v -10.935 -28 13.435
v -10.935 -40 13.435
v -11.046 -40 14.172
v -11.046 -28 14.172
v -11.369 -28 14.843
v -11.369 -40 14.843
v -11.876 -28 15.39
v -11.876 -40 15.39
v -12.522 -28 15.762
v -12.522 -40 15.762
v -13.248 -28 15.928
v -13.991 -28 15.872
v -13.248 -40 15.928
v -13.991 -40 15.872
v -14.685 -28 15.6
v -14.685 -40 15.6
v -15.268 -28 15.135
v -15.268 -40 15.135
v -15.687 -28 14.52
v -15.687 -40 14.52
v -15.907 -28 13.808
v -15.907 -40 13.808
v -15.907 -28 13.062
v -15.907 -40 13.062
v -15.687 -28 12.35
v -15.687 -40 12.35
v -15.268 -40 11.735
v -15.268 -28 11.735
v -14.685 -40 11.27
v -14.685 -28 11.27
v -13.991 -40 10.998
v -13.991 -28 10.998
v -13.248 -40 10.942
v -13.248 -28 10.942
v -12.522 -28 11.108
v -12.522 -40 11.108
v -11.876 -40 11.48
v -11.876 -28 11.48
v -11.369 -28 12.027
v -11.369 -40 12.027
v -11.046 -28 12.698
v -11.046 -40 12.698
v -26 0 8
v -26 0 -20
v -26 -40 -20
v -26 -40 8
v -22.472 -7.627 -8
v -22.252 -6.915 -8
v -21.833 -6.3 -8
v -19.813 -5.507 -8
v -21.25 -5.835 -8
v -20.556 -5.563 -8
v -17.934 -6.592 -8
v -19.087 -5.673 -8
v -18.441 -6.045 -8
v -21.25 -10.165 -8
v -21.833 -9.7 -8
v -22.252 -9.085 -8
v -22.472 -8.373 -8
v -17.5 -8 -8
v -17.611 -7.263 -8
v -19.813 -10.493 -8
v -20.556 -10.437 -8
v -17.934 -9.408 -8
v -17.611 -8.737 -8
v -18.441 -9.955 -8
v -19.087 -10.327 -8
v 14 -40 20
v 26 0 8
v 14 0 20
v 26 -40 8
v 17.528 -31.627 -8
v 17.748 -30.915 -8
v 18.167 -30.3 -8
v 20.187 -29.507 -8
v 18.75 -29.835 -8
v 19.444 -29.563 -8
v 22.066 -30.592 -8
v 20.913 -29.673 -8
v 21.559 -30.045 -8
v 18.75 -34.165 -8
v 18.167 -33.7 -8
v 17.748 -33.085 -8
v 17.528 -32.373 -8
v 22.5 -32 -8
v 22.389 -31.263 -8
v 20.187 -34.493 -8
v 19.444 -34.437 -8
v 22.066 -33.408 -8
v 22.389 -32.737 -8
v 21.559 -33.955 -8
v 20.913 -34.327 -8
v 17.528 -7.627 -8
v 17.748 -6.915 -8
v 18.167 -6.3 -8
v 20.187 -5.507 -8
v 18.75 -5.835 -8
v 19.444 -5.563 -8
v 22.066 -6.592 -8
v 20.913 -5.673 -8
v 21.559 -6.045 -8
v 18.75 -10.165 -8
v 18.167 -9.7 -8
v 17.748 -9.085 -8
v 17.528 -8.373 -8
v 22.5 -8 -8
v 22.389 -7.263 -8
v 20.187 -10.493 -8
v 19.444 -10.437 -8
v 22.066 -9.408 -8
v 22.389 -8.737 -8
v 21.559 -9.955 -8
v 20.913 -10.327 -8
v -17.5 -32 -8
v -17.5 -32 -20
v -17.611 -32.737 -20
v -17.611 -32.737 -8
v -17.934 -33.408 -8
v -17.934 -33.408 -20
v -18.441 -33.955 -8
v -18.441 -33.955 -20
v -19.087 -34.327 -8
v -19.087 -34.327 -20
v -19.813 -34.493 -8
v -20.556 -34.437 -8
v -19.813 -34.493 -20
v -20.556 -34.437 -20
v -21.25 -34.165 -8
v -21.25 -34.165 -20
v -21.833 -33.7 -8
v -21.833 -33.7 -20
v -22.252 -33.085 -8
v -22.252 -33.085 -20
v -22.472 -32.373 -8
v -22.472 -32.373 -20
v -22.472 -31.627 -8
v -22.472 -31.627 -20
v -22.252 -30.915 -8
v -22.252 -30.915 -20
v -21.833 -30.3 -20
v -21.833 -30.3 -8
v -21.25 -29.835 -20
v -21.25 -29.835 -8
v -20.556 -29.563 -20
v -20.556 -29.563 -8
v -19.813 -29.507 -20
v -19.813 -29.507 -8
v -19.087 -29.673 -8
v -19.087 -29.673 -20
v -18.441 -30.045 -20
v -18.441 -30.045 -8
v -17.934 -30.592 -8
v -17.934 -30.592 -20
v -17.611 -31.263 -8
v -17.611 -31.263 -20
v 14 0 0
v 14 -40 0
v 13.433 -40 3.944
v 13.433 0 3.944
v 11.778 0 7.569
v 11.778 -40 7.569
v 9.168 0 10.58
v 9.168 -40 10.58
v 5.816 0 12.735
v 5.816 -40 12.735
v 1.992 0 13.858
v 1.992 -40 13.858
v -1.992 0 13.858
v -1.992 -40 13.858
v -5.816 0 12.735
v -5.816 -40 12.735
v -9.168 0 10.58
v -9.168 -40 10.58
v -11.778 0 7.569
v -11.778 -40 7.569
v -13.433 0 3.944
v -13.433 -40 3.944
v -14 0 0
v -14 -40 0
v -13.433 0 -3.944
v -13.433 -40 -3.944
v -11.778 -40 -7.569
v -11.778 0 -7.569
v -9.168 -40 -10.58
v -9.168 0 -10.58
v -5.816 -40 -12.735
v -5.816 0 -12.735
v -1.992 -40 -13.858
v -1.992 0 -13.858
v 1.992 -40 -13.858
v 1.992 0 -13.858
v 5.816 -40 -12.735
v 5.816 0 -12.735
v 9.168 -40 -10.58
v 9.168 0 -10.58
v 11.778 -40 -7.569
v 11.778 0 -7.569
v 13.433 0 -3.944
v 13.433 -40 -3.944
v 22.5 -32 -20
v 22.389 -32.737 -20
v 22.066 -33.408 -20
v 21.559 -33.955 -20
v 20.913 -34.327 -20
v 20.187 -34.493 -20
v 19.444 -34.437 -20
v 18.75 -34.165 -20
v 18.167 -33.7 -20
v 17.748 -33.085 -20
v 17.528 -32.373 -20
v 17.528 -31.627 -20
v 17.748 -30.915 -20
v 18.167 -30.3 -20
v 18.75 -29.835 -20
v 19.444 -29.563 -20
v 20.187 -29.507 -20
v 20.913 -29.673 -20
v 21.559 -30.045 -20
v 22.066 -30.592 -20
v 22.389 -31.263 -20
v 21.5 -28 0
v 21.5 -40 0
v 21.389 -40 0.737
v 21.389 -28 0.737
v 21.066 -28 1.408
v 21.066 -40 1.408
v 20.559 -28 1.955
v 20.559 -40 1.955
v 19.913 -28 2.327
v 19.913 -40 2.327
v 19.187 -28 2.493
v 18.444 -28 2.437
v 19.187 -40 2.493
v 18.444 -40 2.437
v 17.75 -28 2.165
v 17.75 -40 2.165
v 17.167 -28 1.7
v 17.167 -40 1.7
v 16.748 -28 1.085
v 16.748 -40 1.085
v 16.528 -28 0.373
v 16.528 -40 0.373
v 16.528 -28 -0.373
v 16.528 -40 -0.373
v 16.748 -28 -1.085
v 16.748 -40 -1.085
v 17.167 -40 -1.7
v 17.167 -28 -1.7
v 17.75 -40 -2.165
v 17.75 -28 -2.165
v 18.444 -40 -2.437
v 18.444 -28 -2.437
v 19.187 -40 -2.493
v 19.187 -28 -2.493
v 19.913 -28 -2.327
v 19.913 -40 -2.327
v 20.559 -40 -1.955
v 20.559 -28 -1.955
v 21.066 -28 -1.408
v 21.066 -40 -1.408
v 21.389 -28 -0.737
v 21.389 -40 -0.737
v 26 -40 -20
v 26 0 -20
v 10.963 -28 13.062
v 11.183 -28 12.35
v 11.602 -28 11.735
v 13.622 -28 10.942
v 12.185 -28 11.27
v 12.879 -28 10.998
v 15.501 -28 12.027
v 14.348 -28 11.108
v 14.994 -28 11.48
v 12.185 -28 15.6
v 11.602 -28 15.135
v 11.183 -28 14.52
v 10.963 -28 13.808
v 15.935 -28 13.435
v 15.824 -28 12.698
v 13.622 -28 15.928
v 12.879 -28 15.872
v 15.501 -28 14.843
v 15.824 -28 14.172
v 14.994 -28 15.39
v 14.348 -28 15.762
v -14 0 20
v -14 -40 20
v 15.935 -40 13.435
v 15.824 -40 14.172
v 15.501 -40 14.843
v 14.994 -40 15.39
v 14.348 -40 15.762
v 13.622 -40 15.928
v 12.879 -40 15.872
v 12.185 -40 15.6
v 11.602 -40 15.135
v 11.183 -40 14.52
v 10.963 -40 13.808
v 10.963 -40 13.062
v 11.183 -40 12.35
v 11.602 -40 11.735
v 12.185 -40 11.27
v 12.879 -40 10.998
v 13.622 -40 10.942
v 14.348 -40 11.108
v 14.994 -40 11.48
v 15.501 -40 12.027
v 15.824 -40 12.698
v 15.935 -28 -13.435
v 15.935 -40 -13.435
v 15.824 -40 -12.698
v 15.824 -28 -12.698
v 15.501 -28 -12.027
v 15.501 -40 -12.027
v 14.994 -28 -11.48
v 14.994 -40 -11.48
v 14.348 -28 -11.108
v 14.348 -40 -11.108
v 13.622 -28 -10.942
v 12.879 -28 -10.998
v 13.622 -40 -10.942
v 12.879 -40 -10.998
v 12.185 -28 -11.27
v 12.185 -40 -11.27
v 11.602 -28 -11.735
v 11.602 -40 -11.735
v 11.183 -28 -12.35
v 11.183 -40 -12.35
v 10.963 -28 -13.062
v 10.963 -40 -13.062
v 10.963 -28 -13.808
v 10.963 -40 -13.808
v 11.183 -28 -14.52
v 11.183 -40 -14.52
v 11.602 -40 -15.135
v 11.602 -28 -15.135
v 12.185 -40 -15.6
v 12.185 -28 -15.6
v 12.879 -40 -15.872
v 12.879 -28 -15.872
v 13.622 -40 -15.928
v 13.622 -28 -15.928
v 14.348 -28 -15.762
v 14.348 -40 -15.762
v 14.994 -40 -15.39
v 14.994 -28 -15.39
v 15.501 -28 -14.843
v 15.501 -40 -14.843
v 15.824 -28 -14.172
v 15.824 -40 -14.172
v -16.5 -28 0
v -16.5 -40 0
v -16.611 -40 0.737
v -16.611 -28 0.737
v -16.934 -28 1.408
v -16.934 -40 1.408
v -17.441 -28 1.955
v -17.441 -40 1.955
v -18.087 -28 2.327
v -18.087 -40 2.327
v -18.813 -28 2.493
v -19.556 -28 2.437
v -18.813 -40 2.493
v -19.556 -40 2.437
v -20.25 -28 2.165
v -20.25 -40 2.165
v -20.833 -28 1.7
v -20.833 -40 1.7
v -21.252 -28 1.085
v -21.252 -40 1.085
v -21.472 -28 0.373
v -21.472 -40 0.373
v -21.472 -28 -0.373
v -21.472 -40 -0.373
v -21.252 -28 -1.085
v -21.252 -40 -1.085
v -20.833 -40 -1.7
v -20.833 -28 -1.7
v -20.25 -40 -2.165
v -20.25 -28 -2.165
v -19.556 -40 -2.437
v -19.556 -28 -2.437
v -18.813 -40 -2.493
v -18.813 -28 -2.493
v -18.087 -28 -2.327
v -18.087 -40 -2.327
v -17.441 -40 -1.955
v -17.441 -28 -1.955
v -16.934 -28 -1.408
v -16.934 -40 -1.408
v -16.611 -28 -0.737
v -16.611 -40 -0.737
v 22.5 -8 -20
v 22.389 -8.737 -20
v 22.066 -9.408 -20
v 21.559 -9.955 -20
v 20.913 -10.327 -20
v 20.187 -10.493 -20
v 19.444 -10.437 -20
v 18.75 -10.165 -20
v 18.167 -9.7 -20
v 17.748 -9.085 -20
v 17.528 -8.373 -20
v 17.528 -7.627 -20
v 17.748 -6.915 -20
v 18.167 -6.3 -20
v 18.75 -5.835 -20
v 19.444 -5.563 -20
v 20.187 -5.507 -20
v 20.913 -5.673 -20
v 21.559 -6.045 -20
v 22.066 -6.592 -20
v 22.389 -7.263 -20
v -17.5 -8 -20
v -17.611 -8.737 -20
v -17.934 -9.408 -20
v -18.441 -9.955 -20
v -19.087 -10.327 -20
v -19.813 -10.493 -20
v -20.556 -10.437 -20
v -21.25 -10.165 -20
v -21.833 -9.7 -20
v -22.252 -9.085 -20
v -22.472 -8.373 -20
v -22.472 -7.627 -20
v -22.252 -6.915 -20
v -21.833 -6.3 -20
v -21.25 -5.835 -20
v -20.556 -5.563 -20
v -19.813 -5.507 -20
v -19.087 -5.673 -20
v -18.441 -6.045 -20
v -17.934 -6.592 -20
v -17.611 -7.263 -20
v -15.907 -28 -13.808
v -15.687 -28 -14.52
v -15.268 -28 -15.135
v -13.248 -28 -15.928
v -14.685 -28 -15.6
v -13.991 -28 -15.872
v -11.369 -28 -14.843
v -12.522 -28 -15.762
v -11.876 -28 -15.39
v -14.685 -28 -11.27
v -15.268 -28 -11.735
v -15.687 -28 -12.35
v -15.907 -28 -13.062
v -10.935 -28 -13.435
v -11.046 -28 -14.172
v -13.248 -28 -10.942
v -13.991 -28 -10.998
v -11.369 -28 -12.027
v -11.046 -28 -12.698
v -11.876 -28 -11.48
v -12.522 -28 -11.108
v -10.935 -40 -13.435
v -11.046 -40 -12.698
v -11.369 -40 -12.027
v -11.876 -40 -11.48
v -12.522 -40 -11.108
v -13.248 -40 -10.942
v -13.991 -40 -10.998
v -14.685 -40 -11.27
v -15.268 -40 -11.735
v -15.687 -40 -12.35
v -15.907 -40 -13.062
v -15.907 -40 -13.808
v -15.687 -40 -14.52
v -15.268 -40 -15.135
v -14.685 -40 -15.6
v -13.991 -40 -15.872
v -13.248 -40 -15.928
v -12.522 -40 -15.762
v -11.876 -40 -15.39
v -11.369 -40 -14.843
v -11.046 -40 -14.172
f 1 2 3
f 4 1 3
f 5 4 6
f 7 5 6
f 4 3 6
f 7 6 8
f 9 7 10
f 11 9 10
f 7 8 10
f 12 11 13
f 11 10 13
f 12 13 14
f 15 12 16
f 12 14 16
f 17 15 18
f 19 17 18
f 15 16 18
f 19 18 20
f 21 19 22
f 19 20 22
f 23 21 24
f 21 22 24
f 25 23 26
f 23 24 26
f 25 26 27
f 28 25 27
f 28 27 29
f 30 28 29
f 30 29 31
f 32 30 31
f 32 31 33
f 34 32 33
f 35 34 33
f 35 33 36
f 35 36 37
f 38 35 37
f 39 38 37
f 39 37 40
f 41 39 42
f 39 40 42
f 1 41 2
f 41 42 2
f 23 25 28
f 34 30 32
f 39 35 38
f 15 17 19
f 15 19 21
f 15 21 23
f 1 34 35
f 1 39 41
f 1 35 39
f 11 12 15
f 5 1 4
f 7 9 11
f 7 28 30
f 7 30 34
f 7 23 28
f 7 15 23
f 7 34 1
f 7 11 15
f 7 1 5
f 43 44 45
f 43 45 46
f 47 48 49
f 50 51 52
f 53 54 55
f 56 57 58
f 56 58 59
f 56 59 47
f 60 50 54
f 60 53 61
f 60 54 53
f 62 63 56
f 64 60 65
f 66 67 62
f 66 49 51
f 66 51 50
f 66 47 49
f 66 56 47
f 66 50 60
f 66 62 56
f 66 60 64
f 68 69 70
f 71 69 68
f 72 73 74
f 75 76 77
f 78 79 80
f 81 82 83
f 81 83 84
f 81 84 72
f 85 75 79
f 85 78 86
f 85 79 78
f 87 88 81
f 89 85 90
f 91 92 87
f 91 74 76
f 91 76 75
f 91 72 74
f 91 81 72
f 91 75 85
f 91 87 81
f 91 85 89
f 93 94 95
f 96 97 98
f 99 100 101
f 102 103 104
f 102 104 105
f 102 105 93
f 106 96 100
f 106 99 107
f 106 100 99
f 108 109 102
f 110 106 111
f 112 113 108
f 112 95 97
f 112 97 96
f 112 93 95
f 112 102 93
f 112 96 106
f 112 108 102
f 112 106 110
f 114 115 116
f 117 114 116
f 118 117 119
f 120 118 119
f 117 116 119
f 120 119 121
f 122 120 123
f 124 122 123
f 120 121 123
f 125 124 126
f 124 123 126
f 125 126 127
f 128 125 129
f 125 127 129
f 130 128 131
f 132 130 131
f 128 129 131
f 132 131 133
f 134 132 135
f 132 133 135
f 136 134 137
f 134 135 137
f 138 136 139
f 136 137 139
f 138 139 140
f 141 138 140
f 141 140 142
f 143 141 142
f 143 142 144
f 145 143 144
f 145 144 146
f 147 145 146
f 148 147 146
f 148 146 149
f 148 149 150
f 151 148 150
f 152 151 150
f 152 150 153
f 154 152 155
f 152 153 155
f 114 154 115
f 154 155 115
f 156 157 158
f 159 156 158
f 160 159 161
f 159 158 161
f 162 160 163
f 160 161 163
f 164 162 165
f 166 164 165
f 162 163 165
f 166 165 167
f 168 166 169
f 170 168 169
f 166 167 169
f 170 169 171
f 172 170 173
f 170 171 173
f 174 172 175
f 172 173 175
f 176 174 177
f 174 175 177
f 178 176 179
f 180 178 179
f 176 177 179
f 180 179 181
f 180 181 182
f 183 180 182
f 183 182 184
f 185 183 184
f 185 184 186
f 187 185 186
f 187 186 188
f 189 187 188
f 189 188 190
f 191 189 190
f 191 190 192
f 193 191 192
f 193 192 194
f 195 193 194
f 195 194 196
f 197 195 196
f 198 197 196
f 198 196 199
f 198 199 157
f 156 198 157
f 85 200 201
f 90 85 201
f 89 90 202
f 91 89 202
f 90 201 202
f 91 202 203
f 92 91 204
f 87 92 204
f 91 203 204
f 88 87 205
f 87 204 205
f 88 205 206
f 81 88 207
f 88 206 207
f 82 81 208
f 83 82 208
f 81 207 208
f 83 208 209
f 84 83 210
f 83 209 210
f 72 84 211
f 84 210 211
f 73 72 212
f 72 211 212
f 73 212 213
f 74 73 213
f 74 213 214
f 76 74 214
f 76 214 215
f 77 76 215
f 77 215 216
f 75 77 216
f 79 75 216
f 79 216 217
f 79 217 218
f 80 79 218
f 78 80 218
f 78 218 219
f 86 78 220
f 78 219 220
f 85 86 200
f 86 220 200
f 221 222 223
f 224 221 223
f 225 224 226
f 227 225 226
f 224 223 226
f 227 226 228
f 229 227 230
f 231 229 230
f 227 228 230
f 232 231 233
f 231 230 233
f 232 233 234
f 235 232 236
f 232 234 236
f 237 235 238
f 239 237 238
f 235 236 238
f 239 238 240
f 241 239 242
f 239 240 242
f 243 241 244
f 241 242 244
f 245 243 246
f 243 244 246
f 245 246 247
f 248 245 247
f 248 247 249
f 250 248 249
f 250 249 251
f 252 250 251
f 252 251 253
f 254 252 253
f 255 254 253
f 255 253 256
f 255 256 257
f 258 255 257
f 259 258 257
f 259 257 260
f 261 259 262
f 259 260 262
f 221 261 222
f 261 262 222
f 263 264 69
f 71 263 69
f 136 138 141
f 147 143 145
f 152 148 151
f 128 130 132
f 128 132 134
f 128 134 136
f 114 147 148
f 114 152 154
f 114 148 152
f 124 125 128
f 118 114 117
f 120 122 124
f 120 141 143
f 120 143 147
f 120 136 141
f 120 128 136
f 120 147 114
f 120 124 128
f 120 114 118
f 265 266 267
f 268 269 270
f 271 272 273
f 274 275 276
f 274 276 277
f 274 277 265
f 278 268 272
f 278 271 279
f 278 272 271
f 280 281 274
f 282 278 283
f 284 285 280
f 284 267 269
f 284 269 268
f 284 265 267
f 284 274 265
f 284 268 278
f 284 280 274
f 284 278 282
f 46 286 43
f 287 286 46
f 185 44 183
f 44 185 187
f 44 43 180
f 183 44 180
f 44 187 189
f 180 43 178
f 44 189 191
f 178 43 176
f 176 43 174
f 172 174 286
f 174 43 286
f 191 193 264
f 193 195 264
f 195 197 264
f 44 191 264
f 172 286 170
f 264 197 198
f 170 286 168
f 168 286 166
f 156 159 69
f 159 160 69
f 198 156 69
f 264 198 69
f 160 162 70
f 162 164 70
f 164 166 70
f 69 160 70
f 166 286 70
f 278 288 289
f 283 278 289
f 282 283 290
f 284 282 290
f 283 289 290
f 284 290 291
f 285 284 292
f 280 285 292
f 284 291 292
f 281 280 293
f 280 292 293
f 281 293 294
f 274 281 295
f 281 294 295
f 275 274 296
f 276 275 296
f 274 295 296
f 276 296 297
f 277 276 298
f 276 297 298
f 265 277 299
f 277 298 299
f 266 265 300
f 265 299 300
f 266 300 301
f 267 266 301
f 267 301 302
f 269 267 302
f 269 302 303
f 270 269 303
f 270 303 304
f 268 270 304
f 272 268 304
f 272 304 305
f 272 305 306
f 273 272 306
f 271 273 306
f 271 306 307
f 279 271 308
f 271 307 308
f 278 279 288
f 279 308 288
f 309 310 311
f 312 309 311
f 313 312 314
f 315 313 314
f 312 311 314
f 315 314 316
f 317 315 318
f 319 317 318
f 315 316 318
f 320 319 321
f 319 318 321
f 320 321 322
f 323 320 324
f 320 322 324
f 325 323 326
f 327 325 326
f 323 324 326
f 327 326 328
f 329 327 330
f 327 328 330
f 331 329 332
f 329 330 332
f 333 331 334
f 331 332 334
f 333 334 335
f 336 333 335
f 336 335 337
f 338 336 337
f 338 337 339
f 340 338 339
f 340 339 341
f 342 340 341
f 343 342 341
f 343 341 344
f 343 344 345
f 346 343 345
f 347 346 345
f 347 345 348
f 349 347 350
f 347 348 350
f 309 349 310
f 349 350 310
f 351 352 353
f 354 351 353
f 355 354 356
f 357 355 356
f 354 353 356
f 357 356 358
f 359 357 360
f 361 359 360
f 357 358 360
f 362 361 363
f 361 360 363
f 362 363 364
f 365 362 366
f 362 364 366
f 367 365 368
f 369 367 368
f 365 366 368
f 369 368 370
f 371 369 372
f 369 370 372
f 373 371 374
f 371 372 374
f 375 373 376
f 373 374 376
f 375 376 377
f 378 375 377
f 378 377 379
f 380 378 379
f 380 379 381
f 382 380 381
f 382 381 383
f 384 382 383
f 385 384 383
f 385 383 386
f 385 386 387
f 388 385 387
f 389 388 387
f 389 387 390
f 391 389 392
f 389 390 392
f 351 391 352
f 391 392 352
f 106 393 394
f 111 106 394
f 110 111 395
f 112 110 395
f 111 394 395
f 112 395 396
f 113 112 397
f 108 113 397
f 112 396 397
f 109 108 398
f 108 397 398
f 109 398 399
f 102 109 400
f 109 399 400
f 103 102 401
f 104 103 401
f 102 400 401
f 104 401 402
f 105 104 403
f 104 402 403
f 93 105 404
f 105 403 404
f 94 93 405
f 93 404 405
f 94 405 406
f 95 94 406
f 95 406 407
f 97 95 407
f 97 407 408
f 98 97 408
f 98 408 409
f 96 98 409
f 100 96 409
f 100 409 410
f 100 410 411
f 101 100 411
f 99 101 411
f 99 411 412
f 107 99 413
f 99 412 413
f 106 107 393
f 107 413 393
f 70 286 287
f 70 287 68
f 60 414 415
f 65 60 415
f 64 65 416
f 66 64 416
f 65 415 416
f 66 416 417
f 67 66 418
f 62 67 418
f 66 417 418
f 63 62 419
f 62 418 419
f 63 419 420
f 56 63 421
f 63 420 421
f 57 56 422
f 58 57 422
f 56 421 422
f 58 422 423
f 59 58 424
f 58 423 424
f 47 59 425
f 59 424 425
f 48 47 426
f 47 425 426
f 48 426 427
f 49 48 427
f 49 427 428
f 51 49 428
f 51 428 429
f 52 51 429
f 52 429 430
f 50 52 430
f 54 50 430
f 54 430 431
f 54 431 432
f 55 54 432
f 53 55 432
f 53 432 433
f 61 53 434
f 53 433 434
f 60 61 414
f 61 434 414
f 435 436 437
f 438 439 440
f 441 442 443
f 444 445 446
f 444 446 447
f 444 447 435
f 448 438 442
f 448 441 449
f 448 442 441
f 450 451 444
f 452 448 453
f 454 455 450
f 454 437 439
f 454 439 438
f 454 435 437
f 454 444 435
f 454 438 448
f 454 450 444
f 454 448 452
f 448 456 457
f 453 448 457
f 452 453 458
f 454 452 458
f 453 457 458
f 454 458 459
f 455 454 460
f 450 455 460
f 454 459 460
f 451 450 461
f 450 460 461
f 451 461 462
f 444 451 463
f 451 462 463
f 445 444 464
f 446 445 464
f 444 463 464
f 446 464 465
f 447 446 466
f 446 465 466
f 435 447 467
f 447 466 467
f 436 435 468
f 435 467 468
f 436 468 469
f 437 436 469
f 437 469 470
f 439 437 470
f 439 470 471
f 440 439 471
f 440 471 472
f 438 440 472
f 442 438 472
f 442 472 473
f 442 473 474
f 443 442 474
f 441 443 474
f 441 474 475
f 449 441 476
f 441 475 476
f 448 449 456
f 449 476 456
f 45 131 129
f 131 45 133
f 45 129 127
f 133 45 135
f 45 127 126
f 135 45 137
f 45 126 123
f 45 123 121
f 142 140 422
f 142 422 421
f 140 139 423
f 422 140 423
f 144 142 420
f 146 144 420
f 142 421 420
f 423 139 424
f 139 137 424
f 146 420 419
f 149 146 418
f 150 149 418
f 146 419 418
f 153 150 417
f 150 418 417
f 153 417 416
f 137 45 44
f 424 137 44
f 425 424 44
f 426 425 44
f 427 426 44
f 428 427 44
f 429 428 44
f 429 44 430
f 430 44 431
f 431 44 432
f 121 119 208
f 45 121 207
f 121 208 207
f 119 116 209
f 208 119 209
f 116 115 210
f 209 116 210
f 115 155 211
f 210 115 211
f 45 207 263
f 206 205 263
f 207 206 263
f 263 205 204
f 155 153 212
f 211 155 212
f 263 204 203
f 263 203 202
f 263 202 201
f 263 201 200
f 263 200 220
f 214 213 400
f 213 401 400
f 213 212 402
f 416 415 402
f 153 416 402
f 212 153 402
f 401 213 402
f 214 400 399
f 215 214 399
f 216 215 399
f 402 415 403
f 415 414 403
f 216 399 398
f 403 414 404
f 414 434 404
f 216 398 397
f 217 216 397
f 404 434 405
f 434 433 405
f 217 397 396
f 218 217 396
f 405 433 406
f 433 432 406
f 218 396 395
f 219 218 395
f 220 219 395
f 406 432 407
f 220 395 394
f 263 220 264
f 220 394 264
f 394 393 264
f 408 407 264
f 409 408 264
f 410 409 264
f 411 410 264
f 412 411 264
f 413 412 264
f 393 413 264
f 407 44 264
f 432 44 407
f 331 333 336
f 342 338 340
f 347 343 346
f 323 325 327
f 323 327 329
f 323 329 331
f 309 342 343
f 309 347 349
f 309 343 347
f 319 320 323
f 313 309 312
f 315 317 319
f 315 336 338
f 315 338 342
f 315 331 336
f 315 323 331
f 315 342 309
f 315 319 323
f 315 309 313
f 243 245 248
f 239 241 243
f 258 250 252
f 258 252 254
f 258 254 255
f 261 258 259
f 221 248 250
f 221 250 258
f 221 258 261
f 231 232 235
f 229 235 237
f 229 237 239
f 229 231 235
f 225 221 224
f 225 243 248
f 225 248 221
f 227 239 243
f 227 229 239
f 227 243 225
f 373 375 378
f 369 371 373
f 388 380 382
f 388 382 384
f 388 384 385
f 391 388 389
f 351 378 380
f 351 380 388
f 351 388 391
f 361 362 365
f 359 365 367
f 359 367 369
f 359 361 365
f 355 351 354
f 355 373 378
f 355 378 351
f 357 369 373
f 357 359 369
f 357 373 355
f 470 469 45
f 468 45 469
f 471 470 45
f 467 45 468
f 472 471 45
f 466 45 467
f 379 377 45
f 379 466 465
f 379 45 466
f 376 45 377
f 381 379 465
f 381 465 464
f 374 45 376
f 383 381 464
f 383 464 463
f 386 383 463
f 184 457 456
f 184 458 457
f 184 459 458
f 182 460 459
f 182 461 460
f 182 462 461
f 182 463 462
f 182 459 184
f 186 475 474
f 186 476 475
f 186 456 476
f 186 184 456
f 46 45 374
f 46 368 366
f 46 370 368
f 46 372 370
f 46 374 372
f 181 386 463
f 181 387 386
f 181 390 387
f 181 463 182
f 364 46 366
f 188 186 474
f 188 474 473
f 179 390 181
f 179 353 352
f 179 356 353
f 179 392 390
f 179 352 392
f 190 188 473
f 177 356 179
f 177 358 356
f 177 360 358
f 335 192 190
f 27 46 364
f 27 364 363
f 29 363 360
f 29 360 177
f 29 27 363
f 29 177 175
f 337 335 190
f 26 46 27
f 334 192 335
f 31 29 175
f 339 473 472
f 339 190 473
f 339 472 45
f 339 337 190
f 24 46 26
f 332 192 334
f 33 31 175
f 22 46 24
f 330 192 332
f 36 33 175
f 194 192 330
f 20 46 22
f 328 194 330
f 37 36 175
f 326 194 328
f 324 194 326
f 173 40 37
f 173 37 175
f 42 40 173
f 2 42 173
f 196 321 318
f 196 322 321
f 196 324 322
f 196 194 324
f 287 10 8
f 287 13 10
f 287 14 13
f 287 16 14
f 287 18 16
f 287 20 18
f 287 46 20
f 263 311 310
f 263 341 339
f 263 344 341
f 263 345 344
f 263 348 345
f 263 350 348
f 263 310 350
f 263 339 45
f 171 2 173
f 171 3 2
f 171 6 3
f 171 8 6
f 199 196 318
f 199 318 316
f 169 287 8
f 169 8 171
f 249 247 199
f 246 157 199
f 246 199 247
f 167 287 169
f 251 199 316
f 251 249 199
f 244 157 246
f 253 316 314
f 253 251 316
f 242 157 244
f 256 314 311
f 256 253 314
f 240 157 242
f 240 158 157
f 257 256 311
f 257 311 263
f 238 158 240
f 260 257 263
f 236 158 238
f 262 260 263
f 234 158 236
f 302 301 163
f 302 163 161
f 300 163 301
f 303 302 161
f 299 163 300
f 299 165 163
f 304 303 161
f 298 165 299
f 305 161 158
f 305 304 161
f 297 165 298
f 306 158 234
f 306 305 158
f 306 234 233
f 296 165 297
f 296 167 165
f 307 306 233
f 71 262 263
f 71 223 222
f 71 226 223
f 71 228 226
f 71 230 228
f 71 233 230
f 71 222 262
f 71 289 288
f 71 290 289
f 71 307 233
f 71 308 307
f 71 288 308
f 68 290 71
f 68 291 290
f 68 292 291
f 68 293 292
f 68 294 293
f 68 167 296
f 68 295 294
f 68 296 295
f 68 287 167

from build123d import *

# Parameters (mm, degrees)
F0_W     = 52
F0_H     = 40
F1_DEPTH = 40
F2_R     = 14
F3_DEPTH = 40.001
F4_SIZE  = 12
F6_R     = 2.5
F7_DEPTH = 12
F8_R     = 2.5
F9_DEPTH = 12


with BuildPart() as f1:
    # F0 (on Front) → F1 (new body)
    with BuildSketch(Plane.XZ):
        Rectangle(F0_W, F0_H)
    extrude(amount=F1_DEPTH)

    # F2 (on face) → F3 (cut, through all)
    with BuildSketch(Plane.XZ.offset(40)):
        Circle(F2_R)
    extrude(amount=-F3_DEPTH, mode=Mode.SUBTRACT)

    # F4
    f4_edges = [f1.edges().sort_by_distance(p)[0] for p in [
        (-26, -20, 20),
        (26, -20, 20),
    ]]
    chamfer(f4_edges, length=F4_SIZE)

    # F6 (on face) → F7 (cut)
    with BuildSketch(Plane.XZ.offset(40)):
        with Locations((-19, 0)):
            Circle(F6_R)
        with Locations((-13.435029, -13.435029)):
            Circle(F6_R)
        with Locations((13.435029, -13.435029)):
            Circle(F6_R)
        with Locations((19, 0)):
            Circle(F6_R)
        with Locations((13.435029, 13.435029)):
            Circle(F6_R)
        with Locations((-13.435029, 13.435029)):
            Circle(F6_R)
    extrude(amount=-F7_DEPTH, mode=Mode.SUBTRACT)

    # F8 (on face) → F9 (cut)
    with BuildSketch(Plane(origin=(0, 0, -20), x_dir=(1, 0, 0), z_dir=(0, 0, -1))):
        with Locations((-20, 32)):
            Circle(F8_R)
        with Locations((20, 32)):
            Circle(F8_R)
        with Locations((20, 8)):
            Circle(F8_R)
        with Locations((-20, 8)):
            Circle(F8_R)
    extrude(amount=-F9_DEPTH, mode=Mode.SUBTRACT)


solid = f1.part
